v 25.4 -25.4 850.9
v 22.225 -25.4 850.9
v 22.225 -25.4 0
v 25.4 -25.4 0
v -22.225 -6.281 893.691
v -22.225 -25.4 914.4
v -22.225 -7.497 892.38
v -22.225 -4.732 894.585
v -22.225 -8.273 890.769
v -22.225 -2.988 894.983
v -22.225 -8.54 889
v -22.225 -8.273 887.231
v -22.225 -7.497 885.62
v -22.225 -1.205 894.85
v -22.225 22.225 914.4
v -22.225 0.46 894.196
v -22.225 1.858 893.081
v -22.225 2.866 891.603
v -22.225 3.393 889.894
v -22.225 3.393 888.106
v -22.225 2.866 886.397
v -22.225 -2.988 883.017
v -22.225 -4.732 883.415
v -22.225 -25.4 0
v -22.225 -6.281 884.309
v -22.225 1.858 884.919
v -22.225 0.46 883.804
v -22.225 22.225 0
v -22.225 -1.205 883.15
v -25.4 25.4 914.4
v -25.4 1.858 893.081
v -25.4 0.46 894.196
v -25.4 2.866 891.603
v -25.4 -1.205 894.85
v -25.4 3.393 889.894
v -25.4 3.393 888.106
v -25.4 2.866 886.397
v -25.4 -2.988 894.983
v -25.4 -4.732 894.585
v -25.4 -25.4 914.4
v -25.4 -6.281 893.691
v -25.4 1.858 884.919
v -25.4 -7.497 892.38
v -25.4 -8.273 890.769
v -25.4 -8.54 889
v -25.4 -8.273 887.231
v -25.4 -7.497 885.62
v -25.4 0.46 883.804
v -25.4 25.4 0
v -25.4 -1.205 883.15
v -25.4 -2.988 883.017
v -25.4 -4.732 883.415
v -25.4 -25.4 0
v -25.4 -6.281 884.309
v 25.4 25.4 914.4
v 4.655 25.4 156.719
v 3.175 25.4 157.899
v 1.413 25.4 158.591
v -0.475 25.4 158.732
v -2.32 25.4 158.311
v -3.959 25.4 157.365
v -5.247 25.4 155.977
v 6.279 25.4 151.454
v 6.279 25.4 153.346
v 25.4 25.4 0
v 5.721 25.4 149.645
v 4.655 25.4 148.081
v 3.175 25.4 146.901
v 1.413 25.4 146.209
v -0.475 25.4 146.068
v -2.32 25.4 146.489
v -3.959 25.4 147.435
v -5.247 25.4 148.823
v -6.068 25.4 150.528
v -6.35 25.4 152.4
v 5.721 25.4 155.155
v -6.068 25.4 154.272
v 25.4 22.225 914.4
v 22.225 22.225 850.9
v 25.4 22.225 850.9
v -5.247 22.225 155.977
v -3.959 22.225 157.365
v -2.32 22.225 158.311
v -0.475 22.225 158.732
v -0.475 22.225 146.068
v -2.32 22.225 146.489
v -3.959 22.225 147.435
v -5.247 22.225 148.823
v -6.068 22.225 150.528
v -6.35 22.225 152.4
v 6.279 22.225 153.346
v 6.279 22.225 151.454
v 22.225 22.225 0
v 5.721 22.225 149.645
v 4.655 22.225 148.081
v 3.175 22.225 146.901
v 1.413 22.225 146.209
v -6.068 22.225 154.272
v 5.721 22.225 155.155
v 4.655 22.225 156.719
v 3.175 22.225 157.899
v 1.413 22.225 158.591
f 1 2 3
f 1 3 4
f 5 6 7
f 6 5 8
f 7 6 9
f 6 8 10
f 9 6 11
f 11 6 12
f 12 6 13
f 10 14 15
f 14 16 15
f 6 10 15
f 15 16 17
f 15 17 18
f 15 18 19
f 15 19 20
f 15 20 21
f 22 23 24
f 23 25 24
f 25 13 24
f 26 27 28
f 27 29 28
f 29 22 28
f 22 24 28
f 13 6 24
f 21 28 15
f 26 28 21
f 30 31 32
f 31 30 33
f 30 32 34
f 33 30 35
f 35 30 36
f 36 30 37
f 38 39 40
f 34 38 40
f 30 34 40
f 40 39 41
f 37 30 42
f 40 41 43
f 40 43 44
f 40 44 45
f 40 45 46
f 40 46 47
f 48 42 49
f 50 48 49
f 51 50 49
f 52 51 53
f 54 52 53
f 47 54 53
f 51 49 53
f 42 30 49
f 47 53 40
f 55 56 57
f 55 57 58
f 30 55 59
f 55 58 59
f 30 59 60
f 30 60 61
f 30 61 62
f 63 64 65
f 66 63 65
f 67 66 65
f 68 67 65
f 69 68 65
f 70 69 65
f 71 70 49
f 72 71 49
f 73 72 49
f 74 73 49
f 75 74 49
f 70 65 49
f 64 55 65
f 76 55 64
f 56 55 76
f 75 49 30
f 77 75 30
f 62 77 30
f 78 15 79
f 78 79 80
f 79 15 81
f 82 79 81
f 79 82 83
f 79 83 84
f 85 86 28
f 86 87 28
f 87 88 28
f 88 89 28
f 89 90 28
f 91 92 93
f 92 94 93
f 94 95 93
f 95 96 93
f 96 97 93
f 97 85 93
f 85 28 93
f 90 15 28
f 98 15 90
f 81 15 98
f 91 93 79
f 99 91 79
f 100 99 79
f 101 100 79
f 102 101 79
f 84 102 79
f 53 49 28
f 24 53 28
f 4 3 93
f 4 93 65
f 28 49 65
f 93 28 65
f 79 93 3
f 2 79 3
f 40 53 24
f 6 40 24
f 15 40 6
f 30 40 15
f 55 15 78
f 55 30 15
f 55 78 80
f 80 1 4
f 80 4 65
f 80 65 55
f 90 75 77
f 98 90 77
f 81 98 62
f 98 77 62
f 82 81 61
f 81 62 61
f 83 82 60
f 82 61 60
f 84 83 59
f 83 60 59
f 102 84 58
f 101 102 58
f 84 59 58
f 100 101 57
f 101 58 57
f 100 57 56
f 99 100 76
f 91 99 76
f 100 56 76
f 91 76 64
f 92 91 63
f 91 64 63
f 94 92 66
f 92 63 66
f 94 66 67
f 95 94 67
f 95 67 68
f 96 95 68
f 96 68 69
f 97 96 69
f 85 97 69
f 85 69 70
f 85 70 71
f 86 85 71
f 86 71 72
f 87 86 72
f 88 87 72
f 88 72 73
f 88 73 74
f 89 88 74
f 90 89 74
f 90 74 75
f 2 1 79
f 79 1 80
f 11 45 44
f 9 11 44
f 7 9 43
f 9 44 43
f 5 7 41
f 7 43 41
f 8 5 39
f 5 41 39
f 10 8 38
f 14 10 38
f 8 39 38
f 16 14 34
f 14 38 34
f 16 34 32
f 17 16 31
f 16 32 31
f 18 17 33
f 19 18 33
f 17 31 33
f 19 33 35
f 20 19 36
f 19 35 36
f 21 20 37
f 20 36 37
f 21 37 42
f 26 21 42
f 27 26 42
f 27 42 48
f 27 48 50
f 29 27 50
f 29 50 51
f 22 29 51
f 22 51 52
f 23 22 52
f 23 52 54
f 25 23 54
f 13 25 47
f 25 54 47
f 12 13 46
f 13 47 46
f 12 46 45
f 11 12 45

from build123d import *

# Parameters (mm, degrees)
F1_DEPTH = 914.4
F2_R     = 6
F3_DEPTH = 3.175
F4_W     = 47.625
F4_H     = 63.5
F5_DEPTH = 25.4
F6_R     = 6.35
F7_DEPTH = 25.4


with BuildPart() as f1:
    # F0 (on Top) → F1 (new body)
    with BuildSketch(Plane.XY):
        Polygon((22.225, -25.4), (25.4, -25.4), (25.4, 25.4), (-25.4, 25.4), (-25.4, -25.4), (-22.225, -25.4), (-22.225, 22.225), (22.225, 22.225), align=None)
    extrude(amount=F1_DEPTH)

    # F2 (on face) → F3 (cut, through all)
    with BuildSketch(Plane(origin=(-25.4, 0, 0), x_dir=(0, -1, 0), z_dir=(-1, 0, 0))):
        with Locations((2.54, 889)):
            Circle(F2_R)
    extrude(amount=-F3_DEPTH, mode=Mode.SUBTRACT)

    # F4 (on face) → F5 (cut)
    with BuildSketch(Plane.YZ.offset(25.4)):
        with Locations((-1.5875, 882.65)):
            Rectangle(F4_W, F4_H)
    extrude(amount=-F5_DEPTH, mode=Mode.SUBTRACT)

    # F6 (on face) → F7 (cut)
    with BuildSketch(Plane(origin=(0, 25.4, 0), x_dir=(-1, 0, 0), z_dir=(0, 1, 0))):
        with Locations((0, 152.4)):
            Circle(F6_R)
    extrude(amount=-F7_DEPTH, mode=Mode.SUBTRACT)


solid = f1.part
